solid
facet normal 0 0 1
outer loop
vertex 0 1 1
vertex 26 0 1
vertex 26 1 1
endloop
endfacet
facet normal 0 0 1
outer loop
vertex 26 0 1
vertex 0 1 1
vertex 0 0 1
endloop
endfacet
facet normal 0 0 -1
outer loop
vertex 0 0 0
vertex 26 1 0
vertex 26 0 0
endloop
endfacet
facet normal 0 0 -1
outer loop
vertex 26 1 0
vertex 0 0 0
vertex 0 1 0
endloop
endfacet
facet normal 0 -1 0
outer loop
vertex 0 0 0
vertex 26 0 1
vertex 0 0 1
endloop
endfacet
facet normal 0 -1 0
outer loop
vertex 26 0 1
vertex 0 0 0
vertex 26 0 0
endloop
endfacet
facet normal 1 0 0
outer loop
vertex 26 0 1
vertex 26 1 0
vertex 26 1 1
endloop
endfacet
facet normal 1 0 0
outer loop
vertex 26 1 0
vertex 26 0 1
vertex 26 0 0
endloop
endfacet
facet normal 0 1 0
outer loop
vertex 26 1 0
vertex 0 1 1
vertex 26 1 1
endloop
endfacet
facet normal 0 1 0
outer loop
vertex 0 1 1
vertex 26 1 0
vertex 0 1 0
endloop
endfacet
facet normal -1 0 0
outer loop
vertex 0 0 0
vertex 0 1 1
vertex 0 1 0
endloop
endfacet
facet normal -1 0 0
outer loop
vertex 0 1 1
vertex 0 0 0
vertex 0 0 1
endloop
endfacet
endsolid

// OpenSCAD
function res() = 123;
module t() {
	a=10;
	b=20;
	c=8;
	d=2;

	res = function () a+b-c/d;

	module u() {

		a=100;
		b=200;
		c=80;
		d=20;

		result=res();
		cube([result,1,1]);
	}
	u();
} 
t();
